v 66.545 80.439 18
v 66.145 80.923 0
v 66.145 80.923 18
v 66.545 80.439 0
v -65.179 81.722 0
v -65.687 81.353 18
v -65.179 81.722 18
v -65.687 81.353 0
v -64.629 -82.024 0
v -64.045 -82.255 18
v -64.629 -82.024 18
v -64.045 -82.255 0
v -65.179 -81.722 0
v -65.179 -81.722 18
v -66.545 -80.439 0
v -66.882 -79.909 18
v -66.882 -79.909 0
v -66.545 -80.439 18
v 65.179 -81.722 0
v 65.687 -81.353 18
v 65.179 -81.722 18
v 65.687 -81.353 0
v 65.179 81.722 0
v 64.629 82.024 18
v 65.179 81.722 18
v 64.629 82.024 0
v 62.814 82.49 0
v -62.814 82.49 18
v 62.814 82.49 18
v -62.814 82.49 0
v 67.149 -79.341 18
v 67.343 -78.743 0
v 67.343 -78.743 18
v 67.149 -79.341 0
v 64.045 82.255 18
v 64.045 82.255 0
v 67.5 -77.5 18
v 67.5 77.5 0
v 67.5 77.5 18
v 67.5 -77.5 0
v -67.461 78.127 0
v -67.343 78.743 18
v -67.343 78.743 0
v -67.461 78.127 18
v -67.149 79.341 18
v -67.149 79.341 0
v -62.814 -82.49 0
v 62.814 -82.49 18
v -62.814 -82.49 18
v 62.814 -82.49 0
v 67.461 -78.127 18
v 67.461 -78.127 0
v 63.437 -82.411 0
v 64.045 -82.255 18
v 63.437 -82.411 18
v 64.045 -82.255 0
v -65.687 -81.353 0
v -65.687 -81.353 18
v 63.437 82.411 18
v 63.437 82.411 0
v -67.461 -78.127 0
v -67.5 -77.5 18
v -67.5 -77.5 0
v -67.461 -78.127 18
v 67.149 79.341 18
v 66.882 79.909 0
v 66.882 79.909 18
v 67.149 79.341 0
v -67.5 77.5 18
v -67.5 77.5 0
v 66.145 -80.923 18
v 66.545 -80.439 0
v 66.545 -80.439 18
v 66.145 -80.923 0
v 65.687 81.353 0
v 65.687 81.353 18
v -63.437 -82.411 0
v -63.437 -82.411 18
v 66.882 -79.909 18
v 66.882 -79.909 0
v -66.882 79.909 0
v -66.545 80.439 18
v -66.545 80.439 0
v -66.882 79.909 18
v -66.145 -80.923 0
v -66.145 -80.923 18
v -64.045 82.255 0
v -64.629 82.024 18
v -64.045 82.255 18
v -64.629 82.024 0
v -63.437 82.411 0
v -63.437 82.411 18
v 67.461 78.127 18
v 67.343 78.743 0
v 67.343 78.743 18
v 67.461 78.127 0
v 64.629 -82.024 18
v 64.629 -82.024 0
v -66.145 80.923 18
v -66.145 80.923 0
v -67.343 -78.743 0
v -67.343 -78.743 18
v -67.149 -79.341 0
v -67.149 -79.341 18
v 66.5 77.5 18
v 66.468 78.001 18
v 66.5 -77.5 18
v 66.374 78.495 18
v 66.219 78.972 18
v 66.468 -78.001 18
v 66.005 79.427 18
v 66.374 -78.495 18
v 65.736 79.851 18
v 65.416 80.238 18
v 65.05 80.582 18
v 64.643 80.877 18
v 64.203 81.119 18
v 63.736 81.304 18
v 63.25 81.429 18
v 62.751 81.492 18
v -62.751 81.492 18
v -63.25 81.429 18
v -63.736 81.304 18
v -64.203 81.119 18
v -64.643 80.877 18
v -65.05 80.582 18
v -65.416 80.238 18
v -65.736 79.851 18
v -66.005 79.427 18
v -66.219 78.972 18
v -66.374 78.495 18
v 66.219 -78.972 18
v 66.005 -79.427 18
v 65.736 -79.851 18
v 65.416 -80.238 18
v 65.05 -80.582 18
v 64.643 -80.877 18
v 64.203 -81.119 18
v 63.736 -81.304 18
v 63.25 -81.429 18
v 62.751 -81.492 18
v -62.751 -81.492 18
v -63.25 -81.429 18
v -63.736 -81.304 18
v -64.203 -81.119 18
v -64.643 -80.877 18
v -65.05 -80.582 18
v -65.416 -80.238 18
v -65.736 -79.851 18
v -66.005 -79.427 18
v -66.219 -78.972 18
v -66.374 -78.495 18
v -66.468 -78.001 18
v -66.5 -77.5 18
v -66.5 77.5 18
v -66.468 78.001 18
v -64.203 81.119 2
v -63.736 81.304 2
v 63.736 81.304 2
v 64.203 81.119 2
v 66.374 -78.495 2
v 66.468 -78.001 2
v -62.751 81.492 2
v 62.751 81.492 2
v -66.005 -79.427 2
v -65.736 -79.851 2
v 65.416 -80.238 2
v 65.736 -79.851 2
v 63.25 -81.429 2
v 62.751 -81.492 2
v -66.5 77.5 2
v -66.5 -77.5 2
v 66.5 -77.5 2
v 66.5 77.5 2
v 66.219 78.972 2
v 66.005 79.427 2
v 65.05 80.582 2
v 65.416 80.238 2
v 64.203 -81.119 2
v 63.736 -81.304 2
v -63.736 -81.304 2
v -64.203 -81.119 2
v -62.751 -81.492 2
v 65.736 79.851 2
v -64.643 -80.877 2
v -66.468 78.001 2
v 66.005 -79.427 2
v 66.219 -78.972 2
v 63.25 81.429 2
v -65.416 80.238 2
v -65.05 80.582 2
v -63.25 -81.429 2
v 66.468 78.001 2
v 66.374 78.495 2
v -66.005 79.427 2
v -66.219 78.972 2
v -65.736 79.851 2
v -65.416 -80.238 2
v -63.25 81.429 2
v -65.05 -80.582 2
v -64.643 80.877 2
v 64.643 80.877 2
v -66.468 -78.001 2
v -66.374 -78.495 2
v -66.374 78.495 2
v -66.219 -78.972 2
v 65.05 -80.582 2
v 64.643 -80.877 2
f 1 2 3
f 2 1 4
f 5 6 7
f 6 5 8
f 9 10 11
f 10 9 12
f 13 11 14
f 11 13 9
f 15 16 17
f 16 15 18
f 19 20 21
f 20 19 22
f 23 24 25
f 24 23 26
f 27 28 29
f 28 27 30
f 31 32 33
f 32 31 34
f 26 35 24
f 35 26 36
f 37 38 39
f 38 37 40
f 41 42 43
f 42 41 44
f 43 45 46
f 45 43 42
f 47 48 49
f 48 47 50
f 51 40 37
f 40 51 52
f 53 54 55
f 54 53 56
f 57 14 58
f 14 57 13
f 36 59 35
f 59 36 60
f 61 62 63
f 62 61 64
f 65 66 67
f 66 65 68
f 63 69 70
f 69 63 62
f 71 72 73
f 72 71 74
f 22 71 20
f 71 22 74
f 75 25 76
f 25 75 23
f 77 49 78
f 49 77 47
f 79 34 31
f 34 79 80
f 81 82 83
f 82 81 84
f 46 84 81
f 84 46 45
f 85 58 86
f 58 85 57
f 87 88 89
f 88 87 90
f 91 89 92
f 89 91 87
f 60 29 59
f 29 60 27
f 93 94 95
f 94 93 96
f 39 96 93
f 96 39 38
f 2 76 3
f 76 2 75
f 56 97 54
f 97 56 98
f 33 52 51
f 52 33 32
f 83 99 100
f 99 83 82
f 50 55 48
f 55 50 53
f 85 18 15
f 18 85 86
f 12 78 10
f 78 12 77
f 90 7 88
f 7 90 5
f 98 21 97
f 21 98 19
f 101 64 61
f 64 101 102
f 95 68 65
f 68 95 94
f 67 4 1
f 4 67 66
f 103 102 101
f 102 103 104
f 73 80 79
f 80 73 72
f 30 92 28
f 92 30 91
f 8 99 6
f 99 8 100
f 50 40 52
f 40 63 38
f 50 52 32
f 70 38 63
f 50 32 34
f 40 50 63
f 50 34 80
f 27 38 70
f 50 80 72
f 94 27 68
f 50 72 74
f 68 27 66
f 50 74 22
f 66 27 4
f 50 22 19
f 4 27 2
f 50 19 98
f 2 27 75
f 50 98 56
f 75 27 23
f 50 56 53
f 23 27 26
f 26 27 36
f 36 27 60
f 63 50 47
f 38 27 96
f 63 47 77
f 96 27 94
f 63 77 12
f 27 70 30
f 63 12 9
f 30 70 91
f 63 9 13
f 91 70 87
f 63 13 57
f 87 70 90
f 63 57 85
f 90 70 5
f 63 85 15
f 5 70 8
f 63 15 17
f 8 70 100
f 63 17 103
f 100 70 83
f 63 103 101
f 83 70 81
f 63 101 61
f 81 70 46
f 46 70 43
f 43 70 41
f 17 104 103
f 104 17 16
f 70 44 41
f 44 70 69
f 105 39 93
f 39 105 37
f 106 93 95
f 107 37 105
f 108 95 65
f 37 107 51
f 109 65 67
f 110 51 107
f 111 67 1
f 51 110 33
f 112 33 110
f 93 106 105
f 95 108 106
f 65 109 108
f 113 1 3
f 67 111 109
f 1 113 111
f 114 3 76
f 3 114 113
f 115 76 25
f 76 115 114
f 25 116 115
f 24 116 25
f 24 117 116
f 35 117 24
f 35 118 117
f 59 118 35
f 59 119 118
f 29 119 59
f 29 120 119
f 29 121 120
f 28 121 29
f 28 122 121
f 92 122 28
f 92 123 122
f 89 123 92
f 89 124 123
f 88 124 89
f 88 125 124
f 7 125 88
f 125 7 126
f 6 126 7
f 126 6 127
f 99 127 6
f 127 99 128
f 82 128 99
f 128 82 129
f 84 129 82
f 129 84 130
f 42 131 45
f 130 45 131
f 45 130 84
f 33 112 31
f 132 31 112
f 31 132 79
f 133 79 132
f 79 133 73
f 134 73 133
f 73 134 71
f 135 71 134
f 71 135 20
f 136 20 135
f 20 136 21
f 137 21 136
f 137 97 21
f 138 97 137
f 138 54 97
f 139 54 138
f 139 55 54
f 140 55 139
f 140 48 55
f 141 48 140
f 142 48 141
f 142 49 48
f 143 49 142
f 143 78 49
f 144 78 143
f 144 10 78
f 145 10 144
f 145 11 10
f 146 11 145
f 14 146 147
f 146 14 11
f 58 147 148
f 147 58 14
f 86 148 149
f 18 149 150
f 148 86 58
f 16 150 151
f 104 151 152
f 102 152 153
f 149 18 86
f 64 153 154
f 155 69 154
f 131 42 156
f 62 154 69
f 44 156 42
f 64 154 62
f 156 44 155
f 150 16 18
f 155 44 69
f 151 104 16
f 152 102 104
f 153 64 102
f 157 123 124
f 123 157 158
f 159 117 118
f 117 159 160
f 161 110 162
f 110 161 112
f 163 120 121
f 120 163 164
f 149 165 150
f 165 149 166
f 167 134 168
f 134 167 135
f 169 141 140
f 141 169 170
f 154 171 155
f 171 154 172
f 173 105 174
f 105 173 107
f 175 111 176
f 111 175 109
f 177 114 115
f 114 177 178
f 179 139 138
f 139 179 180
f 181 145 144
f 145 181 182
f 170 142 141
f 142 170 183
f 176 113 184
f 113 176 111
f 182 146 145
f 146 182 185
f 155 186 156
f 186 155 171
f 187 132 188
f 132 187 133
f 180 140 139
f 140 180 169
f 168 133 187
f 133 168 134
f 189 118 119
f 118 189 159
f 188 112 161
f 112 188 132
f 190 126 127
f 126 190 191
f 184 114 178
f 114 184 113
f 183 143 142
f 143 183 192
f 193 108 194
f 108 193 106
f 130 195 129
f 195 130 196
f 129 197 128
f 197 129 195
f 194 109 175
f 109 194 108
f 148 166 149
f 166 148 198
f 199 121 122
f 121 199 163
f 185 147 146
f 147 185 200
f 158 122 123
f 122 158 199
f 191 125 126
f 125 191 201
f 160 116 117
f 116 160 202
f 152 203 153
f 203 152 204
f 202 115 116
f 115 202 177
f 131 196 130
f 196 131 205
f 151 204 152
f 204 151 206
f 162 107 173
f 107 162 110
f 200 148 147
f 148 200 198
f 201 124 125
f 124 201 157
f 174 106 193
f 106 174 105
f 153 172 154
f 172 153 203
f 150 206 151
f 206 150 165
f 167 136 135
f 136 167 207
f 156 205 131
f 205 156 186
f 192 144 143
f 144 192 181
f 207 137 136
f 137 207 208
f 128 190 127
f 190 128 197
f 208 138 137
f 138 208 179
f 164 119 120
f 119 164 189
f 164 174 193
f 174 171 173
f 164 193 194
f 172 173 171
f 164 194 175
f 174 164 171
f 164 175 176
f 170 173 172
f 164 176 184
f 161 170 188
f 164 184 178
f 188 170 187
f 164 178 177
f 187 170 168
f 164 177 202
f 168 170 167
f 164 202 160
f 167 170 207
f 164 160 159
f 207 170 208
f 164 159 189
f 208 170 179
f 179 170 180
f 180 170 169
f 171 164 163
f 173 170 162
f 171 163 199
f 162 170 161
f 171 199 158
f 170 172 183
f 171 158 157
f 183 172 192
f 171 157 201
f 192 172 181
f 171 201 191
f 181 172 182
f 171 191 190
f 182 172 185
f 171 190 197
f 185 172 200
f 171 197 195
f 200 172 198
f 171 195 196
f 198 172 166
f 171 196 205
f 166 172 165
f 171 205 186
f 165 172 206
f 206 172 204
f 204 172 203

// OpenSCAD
$fn = 50;


difference() {
	union() {
		hull() {
			translate(v = [-62.5000000000, 77.5000000000, 0]) {
				cylinder(h = 18, r = 5);
			}
			translate(v = [62.5000000000, 77.5000000000, 0]) {
				cylinder(h = 18, r = 5);
			}
			translate(v = [-62.5000000000, -77.5000000000, 0]) {
				cylinder(h = 18, r = 5);
			}
			translate(v = [62.5000000000, -77.5000000000, 0]) {
				cylinder(h = 18, r = 5);
			}
		}
	}
	union() {
		translate(v = [0, 0, 2]) {
			hull() {
				translate(v = [-62.5000000000, 77.5000000000, 0]) {
					cylinder(h = 16, r = 4);
				}
				translate(v = [62.5000000000, 77.5000000000, 0]) {
					cylinder(h = 16, r = 4);
				}
				translate(v = [-62.5000000000, -77.5000000000, 0]) {
					cylinder(h = 16, r = 4);
				}
				translate(v = [62.5000000000, -77.5000000000, 0]) {
					cylinder(h = 16, r = 4);
				}
			}
		}
	}
}
